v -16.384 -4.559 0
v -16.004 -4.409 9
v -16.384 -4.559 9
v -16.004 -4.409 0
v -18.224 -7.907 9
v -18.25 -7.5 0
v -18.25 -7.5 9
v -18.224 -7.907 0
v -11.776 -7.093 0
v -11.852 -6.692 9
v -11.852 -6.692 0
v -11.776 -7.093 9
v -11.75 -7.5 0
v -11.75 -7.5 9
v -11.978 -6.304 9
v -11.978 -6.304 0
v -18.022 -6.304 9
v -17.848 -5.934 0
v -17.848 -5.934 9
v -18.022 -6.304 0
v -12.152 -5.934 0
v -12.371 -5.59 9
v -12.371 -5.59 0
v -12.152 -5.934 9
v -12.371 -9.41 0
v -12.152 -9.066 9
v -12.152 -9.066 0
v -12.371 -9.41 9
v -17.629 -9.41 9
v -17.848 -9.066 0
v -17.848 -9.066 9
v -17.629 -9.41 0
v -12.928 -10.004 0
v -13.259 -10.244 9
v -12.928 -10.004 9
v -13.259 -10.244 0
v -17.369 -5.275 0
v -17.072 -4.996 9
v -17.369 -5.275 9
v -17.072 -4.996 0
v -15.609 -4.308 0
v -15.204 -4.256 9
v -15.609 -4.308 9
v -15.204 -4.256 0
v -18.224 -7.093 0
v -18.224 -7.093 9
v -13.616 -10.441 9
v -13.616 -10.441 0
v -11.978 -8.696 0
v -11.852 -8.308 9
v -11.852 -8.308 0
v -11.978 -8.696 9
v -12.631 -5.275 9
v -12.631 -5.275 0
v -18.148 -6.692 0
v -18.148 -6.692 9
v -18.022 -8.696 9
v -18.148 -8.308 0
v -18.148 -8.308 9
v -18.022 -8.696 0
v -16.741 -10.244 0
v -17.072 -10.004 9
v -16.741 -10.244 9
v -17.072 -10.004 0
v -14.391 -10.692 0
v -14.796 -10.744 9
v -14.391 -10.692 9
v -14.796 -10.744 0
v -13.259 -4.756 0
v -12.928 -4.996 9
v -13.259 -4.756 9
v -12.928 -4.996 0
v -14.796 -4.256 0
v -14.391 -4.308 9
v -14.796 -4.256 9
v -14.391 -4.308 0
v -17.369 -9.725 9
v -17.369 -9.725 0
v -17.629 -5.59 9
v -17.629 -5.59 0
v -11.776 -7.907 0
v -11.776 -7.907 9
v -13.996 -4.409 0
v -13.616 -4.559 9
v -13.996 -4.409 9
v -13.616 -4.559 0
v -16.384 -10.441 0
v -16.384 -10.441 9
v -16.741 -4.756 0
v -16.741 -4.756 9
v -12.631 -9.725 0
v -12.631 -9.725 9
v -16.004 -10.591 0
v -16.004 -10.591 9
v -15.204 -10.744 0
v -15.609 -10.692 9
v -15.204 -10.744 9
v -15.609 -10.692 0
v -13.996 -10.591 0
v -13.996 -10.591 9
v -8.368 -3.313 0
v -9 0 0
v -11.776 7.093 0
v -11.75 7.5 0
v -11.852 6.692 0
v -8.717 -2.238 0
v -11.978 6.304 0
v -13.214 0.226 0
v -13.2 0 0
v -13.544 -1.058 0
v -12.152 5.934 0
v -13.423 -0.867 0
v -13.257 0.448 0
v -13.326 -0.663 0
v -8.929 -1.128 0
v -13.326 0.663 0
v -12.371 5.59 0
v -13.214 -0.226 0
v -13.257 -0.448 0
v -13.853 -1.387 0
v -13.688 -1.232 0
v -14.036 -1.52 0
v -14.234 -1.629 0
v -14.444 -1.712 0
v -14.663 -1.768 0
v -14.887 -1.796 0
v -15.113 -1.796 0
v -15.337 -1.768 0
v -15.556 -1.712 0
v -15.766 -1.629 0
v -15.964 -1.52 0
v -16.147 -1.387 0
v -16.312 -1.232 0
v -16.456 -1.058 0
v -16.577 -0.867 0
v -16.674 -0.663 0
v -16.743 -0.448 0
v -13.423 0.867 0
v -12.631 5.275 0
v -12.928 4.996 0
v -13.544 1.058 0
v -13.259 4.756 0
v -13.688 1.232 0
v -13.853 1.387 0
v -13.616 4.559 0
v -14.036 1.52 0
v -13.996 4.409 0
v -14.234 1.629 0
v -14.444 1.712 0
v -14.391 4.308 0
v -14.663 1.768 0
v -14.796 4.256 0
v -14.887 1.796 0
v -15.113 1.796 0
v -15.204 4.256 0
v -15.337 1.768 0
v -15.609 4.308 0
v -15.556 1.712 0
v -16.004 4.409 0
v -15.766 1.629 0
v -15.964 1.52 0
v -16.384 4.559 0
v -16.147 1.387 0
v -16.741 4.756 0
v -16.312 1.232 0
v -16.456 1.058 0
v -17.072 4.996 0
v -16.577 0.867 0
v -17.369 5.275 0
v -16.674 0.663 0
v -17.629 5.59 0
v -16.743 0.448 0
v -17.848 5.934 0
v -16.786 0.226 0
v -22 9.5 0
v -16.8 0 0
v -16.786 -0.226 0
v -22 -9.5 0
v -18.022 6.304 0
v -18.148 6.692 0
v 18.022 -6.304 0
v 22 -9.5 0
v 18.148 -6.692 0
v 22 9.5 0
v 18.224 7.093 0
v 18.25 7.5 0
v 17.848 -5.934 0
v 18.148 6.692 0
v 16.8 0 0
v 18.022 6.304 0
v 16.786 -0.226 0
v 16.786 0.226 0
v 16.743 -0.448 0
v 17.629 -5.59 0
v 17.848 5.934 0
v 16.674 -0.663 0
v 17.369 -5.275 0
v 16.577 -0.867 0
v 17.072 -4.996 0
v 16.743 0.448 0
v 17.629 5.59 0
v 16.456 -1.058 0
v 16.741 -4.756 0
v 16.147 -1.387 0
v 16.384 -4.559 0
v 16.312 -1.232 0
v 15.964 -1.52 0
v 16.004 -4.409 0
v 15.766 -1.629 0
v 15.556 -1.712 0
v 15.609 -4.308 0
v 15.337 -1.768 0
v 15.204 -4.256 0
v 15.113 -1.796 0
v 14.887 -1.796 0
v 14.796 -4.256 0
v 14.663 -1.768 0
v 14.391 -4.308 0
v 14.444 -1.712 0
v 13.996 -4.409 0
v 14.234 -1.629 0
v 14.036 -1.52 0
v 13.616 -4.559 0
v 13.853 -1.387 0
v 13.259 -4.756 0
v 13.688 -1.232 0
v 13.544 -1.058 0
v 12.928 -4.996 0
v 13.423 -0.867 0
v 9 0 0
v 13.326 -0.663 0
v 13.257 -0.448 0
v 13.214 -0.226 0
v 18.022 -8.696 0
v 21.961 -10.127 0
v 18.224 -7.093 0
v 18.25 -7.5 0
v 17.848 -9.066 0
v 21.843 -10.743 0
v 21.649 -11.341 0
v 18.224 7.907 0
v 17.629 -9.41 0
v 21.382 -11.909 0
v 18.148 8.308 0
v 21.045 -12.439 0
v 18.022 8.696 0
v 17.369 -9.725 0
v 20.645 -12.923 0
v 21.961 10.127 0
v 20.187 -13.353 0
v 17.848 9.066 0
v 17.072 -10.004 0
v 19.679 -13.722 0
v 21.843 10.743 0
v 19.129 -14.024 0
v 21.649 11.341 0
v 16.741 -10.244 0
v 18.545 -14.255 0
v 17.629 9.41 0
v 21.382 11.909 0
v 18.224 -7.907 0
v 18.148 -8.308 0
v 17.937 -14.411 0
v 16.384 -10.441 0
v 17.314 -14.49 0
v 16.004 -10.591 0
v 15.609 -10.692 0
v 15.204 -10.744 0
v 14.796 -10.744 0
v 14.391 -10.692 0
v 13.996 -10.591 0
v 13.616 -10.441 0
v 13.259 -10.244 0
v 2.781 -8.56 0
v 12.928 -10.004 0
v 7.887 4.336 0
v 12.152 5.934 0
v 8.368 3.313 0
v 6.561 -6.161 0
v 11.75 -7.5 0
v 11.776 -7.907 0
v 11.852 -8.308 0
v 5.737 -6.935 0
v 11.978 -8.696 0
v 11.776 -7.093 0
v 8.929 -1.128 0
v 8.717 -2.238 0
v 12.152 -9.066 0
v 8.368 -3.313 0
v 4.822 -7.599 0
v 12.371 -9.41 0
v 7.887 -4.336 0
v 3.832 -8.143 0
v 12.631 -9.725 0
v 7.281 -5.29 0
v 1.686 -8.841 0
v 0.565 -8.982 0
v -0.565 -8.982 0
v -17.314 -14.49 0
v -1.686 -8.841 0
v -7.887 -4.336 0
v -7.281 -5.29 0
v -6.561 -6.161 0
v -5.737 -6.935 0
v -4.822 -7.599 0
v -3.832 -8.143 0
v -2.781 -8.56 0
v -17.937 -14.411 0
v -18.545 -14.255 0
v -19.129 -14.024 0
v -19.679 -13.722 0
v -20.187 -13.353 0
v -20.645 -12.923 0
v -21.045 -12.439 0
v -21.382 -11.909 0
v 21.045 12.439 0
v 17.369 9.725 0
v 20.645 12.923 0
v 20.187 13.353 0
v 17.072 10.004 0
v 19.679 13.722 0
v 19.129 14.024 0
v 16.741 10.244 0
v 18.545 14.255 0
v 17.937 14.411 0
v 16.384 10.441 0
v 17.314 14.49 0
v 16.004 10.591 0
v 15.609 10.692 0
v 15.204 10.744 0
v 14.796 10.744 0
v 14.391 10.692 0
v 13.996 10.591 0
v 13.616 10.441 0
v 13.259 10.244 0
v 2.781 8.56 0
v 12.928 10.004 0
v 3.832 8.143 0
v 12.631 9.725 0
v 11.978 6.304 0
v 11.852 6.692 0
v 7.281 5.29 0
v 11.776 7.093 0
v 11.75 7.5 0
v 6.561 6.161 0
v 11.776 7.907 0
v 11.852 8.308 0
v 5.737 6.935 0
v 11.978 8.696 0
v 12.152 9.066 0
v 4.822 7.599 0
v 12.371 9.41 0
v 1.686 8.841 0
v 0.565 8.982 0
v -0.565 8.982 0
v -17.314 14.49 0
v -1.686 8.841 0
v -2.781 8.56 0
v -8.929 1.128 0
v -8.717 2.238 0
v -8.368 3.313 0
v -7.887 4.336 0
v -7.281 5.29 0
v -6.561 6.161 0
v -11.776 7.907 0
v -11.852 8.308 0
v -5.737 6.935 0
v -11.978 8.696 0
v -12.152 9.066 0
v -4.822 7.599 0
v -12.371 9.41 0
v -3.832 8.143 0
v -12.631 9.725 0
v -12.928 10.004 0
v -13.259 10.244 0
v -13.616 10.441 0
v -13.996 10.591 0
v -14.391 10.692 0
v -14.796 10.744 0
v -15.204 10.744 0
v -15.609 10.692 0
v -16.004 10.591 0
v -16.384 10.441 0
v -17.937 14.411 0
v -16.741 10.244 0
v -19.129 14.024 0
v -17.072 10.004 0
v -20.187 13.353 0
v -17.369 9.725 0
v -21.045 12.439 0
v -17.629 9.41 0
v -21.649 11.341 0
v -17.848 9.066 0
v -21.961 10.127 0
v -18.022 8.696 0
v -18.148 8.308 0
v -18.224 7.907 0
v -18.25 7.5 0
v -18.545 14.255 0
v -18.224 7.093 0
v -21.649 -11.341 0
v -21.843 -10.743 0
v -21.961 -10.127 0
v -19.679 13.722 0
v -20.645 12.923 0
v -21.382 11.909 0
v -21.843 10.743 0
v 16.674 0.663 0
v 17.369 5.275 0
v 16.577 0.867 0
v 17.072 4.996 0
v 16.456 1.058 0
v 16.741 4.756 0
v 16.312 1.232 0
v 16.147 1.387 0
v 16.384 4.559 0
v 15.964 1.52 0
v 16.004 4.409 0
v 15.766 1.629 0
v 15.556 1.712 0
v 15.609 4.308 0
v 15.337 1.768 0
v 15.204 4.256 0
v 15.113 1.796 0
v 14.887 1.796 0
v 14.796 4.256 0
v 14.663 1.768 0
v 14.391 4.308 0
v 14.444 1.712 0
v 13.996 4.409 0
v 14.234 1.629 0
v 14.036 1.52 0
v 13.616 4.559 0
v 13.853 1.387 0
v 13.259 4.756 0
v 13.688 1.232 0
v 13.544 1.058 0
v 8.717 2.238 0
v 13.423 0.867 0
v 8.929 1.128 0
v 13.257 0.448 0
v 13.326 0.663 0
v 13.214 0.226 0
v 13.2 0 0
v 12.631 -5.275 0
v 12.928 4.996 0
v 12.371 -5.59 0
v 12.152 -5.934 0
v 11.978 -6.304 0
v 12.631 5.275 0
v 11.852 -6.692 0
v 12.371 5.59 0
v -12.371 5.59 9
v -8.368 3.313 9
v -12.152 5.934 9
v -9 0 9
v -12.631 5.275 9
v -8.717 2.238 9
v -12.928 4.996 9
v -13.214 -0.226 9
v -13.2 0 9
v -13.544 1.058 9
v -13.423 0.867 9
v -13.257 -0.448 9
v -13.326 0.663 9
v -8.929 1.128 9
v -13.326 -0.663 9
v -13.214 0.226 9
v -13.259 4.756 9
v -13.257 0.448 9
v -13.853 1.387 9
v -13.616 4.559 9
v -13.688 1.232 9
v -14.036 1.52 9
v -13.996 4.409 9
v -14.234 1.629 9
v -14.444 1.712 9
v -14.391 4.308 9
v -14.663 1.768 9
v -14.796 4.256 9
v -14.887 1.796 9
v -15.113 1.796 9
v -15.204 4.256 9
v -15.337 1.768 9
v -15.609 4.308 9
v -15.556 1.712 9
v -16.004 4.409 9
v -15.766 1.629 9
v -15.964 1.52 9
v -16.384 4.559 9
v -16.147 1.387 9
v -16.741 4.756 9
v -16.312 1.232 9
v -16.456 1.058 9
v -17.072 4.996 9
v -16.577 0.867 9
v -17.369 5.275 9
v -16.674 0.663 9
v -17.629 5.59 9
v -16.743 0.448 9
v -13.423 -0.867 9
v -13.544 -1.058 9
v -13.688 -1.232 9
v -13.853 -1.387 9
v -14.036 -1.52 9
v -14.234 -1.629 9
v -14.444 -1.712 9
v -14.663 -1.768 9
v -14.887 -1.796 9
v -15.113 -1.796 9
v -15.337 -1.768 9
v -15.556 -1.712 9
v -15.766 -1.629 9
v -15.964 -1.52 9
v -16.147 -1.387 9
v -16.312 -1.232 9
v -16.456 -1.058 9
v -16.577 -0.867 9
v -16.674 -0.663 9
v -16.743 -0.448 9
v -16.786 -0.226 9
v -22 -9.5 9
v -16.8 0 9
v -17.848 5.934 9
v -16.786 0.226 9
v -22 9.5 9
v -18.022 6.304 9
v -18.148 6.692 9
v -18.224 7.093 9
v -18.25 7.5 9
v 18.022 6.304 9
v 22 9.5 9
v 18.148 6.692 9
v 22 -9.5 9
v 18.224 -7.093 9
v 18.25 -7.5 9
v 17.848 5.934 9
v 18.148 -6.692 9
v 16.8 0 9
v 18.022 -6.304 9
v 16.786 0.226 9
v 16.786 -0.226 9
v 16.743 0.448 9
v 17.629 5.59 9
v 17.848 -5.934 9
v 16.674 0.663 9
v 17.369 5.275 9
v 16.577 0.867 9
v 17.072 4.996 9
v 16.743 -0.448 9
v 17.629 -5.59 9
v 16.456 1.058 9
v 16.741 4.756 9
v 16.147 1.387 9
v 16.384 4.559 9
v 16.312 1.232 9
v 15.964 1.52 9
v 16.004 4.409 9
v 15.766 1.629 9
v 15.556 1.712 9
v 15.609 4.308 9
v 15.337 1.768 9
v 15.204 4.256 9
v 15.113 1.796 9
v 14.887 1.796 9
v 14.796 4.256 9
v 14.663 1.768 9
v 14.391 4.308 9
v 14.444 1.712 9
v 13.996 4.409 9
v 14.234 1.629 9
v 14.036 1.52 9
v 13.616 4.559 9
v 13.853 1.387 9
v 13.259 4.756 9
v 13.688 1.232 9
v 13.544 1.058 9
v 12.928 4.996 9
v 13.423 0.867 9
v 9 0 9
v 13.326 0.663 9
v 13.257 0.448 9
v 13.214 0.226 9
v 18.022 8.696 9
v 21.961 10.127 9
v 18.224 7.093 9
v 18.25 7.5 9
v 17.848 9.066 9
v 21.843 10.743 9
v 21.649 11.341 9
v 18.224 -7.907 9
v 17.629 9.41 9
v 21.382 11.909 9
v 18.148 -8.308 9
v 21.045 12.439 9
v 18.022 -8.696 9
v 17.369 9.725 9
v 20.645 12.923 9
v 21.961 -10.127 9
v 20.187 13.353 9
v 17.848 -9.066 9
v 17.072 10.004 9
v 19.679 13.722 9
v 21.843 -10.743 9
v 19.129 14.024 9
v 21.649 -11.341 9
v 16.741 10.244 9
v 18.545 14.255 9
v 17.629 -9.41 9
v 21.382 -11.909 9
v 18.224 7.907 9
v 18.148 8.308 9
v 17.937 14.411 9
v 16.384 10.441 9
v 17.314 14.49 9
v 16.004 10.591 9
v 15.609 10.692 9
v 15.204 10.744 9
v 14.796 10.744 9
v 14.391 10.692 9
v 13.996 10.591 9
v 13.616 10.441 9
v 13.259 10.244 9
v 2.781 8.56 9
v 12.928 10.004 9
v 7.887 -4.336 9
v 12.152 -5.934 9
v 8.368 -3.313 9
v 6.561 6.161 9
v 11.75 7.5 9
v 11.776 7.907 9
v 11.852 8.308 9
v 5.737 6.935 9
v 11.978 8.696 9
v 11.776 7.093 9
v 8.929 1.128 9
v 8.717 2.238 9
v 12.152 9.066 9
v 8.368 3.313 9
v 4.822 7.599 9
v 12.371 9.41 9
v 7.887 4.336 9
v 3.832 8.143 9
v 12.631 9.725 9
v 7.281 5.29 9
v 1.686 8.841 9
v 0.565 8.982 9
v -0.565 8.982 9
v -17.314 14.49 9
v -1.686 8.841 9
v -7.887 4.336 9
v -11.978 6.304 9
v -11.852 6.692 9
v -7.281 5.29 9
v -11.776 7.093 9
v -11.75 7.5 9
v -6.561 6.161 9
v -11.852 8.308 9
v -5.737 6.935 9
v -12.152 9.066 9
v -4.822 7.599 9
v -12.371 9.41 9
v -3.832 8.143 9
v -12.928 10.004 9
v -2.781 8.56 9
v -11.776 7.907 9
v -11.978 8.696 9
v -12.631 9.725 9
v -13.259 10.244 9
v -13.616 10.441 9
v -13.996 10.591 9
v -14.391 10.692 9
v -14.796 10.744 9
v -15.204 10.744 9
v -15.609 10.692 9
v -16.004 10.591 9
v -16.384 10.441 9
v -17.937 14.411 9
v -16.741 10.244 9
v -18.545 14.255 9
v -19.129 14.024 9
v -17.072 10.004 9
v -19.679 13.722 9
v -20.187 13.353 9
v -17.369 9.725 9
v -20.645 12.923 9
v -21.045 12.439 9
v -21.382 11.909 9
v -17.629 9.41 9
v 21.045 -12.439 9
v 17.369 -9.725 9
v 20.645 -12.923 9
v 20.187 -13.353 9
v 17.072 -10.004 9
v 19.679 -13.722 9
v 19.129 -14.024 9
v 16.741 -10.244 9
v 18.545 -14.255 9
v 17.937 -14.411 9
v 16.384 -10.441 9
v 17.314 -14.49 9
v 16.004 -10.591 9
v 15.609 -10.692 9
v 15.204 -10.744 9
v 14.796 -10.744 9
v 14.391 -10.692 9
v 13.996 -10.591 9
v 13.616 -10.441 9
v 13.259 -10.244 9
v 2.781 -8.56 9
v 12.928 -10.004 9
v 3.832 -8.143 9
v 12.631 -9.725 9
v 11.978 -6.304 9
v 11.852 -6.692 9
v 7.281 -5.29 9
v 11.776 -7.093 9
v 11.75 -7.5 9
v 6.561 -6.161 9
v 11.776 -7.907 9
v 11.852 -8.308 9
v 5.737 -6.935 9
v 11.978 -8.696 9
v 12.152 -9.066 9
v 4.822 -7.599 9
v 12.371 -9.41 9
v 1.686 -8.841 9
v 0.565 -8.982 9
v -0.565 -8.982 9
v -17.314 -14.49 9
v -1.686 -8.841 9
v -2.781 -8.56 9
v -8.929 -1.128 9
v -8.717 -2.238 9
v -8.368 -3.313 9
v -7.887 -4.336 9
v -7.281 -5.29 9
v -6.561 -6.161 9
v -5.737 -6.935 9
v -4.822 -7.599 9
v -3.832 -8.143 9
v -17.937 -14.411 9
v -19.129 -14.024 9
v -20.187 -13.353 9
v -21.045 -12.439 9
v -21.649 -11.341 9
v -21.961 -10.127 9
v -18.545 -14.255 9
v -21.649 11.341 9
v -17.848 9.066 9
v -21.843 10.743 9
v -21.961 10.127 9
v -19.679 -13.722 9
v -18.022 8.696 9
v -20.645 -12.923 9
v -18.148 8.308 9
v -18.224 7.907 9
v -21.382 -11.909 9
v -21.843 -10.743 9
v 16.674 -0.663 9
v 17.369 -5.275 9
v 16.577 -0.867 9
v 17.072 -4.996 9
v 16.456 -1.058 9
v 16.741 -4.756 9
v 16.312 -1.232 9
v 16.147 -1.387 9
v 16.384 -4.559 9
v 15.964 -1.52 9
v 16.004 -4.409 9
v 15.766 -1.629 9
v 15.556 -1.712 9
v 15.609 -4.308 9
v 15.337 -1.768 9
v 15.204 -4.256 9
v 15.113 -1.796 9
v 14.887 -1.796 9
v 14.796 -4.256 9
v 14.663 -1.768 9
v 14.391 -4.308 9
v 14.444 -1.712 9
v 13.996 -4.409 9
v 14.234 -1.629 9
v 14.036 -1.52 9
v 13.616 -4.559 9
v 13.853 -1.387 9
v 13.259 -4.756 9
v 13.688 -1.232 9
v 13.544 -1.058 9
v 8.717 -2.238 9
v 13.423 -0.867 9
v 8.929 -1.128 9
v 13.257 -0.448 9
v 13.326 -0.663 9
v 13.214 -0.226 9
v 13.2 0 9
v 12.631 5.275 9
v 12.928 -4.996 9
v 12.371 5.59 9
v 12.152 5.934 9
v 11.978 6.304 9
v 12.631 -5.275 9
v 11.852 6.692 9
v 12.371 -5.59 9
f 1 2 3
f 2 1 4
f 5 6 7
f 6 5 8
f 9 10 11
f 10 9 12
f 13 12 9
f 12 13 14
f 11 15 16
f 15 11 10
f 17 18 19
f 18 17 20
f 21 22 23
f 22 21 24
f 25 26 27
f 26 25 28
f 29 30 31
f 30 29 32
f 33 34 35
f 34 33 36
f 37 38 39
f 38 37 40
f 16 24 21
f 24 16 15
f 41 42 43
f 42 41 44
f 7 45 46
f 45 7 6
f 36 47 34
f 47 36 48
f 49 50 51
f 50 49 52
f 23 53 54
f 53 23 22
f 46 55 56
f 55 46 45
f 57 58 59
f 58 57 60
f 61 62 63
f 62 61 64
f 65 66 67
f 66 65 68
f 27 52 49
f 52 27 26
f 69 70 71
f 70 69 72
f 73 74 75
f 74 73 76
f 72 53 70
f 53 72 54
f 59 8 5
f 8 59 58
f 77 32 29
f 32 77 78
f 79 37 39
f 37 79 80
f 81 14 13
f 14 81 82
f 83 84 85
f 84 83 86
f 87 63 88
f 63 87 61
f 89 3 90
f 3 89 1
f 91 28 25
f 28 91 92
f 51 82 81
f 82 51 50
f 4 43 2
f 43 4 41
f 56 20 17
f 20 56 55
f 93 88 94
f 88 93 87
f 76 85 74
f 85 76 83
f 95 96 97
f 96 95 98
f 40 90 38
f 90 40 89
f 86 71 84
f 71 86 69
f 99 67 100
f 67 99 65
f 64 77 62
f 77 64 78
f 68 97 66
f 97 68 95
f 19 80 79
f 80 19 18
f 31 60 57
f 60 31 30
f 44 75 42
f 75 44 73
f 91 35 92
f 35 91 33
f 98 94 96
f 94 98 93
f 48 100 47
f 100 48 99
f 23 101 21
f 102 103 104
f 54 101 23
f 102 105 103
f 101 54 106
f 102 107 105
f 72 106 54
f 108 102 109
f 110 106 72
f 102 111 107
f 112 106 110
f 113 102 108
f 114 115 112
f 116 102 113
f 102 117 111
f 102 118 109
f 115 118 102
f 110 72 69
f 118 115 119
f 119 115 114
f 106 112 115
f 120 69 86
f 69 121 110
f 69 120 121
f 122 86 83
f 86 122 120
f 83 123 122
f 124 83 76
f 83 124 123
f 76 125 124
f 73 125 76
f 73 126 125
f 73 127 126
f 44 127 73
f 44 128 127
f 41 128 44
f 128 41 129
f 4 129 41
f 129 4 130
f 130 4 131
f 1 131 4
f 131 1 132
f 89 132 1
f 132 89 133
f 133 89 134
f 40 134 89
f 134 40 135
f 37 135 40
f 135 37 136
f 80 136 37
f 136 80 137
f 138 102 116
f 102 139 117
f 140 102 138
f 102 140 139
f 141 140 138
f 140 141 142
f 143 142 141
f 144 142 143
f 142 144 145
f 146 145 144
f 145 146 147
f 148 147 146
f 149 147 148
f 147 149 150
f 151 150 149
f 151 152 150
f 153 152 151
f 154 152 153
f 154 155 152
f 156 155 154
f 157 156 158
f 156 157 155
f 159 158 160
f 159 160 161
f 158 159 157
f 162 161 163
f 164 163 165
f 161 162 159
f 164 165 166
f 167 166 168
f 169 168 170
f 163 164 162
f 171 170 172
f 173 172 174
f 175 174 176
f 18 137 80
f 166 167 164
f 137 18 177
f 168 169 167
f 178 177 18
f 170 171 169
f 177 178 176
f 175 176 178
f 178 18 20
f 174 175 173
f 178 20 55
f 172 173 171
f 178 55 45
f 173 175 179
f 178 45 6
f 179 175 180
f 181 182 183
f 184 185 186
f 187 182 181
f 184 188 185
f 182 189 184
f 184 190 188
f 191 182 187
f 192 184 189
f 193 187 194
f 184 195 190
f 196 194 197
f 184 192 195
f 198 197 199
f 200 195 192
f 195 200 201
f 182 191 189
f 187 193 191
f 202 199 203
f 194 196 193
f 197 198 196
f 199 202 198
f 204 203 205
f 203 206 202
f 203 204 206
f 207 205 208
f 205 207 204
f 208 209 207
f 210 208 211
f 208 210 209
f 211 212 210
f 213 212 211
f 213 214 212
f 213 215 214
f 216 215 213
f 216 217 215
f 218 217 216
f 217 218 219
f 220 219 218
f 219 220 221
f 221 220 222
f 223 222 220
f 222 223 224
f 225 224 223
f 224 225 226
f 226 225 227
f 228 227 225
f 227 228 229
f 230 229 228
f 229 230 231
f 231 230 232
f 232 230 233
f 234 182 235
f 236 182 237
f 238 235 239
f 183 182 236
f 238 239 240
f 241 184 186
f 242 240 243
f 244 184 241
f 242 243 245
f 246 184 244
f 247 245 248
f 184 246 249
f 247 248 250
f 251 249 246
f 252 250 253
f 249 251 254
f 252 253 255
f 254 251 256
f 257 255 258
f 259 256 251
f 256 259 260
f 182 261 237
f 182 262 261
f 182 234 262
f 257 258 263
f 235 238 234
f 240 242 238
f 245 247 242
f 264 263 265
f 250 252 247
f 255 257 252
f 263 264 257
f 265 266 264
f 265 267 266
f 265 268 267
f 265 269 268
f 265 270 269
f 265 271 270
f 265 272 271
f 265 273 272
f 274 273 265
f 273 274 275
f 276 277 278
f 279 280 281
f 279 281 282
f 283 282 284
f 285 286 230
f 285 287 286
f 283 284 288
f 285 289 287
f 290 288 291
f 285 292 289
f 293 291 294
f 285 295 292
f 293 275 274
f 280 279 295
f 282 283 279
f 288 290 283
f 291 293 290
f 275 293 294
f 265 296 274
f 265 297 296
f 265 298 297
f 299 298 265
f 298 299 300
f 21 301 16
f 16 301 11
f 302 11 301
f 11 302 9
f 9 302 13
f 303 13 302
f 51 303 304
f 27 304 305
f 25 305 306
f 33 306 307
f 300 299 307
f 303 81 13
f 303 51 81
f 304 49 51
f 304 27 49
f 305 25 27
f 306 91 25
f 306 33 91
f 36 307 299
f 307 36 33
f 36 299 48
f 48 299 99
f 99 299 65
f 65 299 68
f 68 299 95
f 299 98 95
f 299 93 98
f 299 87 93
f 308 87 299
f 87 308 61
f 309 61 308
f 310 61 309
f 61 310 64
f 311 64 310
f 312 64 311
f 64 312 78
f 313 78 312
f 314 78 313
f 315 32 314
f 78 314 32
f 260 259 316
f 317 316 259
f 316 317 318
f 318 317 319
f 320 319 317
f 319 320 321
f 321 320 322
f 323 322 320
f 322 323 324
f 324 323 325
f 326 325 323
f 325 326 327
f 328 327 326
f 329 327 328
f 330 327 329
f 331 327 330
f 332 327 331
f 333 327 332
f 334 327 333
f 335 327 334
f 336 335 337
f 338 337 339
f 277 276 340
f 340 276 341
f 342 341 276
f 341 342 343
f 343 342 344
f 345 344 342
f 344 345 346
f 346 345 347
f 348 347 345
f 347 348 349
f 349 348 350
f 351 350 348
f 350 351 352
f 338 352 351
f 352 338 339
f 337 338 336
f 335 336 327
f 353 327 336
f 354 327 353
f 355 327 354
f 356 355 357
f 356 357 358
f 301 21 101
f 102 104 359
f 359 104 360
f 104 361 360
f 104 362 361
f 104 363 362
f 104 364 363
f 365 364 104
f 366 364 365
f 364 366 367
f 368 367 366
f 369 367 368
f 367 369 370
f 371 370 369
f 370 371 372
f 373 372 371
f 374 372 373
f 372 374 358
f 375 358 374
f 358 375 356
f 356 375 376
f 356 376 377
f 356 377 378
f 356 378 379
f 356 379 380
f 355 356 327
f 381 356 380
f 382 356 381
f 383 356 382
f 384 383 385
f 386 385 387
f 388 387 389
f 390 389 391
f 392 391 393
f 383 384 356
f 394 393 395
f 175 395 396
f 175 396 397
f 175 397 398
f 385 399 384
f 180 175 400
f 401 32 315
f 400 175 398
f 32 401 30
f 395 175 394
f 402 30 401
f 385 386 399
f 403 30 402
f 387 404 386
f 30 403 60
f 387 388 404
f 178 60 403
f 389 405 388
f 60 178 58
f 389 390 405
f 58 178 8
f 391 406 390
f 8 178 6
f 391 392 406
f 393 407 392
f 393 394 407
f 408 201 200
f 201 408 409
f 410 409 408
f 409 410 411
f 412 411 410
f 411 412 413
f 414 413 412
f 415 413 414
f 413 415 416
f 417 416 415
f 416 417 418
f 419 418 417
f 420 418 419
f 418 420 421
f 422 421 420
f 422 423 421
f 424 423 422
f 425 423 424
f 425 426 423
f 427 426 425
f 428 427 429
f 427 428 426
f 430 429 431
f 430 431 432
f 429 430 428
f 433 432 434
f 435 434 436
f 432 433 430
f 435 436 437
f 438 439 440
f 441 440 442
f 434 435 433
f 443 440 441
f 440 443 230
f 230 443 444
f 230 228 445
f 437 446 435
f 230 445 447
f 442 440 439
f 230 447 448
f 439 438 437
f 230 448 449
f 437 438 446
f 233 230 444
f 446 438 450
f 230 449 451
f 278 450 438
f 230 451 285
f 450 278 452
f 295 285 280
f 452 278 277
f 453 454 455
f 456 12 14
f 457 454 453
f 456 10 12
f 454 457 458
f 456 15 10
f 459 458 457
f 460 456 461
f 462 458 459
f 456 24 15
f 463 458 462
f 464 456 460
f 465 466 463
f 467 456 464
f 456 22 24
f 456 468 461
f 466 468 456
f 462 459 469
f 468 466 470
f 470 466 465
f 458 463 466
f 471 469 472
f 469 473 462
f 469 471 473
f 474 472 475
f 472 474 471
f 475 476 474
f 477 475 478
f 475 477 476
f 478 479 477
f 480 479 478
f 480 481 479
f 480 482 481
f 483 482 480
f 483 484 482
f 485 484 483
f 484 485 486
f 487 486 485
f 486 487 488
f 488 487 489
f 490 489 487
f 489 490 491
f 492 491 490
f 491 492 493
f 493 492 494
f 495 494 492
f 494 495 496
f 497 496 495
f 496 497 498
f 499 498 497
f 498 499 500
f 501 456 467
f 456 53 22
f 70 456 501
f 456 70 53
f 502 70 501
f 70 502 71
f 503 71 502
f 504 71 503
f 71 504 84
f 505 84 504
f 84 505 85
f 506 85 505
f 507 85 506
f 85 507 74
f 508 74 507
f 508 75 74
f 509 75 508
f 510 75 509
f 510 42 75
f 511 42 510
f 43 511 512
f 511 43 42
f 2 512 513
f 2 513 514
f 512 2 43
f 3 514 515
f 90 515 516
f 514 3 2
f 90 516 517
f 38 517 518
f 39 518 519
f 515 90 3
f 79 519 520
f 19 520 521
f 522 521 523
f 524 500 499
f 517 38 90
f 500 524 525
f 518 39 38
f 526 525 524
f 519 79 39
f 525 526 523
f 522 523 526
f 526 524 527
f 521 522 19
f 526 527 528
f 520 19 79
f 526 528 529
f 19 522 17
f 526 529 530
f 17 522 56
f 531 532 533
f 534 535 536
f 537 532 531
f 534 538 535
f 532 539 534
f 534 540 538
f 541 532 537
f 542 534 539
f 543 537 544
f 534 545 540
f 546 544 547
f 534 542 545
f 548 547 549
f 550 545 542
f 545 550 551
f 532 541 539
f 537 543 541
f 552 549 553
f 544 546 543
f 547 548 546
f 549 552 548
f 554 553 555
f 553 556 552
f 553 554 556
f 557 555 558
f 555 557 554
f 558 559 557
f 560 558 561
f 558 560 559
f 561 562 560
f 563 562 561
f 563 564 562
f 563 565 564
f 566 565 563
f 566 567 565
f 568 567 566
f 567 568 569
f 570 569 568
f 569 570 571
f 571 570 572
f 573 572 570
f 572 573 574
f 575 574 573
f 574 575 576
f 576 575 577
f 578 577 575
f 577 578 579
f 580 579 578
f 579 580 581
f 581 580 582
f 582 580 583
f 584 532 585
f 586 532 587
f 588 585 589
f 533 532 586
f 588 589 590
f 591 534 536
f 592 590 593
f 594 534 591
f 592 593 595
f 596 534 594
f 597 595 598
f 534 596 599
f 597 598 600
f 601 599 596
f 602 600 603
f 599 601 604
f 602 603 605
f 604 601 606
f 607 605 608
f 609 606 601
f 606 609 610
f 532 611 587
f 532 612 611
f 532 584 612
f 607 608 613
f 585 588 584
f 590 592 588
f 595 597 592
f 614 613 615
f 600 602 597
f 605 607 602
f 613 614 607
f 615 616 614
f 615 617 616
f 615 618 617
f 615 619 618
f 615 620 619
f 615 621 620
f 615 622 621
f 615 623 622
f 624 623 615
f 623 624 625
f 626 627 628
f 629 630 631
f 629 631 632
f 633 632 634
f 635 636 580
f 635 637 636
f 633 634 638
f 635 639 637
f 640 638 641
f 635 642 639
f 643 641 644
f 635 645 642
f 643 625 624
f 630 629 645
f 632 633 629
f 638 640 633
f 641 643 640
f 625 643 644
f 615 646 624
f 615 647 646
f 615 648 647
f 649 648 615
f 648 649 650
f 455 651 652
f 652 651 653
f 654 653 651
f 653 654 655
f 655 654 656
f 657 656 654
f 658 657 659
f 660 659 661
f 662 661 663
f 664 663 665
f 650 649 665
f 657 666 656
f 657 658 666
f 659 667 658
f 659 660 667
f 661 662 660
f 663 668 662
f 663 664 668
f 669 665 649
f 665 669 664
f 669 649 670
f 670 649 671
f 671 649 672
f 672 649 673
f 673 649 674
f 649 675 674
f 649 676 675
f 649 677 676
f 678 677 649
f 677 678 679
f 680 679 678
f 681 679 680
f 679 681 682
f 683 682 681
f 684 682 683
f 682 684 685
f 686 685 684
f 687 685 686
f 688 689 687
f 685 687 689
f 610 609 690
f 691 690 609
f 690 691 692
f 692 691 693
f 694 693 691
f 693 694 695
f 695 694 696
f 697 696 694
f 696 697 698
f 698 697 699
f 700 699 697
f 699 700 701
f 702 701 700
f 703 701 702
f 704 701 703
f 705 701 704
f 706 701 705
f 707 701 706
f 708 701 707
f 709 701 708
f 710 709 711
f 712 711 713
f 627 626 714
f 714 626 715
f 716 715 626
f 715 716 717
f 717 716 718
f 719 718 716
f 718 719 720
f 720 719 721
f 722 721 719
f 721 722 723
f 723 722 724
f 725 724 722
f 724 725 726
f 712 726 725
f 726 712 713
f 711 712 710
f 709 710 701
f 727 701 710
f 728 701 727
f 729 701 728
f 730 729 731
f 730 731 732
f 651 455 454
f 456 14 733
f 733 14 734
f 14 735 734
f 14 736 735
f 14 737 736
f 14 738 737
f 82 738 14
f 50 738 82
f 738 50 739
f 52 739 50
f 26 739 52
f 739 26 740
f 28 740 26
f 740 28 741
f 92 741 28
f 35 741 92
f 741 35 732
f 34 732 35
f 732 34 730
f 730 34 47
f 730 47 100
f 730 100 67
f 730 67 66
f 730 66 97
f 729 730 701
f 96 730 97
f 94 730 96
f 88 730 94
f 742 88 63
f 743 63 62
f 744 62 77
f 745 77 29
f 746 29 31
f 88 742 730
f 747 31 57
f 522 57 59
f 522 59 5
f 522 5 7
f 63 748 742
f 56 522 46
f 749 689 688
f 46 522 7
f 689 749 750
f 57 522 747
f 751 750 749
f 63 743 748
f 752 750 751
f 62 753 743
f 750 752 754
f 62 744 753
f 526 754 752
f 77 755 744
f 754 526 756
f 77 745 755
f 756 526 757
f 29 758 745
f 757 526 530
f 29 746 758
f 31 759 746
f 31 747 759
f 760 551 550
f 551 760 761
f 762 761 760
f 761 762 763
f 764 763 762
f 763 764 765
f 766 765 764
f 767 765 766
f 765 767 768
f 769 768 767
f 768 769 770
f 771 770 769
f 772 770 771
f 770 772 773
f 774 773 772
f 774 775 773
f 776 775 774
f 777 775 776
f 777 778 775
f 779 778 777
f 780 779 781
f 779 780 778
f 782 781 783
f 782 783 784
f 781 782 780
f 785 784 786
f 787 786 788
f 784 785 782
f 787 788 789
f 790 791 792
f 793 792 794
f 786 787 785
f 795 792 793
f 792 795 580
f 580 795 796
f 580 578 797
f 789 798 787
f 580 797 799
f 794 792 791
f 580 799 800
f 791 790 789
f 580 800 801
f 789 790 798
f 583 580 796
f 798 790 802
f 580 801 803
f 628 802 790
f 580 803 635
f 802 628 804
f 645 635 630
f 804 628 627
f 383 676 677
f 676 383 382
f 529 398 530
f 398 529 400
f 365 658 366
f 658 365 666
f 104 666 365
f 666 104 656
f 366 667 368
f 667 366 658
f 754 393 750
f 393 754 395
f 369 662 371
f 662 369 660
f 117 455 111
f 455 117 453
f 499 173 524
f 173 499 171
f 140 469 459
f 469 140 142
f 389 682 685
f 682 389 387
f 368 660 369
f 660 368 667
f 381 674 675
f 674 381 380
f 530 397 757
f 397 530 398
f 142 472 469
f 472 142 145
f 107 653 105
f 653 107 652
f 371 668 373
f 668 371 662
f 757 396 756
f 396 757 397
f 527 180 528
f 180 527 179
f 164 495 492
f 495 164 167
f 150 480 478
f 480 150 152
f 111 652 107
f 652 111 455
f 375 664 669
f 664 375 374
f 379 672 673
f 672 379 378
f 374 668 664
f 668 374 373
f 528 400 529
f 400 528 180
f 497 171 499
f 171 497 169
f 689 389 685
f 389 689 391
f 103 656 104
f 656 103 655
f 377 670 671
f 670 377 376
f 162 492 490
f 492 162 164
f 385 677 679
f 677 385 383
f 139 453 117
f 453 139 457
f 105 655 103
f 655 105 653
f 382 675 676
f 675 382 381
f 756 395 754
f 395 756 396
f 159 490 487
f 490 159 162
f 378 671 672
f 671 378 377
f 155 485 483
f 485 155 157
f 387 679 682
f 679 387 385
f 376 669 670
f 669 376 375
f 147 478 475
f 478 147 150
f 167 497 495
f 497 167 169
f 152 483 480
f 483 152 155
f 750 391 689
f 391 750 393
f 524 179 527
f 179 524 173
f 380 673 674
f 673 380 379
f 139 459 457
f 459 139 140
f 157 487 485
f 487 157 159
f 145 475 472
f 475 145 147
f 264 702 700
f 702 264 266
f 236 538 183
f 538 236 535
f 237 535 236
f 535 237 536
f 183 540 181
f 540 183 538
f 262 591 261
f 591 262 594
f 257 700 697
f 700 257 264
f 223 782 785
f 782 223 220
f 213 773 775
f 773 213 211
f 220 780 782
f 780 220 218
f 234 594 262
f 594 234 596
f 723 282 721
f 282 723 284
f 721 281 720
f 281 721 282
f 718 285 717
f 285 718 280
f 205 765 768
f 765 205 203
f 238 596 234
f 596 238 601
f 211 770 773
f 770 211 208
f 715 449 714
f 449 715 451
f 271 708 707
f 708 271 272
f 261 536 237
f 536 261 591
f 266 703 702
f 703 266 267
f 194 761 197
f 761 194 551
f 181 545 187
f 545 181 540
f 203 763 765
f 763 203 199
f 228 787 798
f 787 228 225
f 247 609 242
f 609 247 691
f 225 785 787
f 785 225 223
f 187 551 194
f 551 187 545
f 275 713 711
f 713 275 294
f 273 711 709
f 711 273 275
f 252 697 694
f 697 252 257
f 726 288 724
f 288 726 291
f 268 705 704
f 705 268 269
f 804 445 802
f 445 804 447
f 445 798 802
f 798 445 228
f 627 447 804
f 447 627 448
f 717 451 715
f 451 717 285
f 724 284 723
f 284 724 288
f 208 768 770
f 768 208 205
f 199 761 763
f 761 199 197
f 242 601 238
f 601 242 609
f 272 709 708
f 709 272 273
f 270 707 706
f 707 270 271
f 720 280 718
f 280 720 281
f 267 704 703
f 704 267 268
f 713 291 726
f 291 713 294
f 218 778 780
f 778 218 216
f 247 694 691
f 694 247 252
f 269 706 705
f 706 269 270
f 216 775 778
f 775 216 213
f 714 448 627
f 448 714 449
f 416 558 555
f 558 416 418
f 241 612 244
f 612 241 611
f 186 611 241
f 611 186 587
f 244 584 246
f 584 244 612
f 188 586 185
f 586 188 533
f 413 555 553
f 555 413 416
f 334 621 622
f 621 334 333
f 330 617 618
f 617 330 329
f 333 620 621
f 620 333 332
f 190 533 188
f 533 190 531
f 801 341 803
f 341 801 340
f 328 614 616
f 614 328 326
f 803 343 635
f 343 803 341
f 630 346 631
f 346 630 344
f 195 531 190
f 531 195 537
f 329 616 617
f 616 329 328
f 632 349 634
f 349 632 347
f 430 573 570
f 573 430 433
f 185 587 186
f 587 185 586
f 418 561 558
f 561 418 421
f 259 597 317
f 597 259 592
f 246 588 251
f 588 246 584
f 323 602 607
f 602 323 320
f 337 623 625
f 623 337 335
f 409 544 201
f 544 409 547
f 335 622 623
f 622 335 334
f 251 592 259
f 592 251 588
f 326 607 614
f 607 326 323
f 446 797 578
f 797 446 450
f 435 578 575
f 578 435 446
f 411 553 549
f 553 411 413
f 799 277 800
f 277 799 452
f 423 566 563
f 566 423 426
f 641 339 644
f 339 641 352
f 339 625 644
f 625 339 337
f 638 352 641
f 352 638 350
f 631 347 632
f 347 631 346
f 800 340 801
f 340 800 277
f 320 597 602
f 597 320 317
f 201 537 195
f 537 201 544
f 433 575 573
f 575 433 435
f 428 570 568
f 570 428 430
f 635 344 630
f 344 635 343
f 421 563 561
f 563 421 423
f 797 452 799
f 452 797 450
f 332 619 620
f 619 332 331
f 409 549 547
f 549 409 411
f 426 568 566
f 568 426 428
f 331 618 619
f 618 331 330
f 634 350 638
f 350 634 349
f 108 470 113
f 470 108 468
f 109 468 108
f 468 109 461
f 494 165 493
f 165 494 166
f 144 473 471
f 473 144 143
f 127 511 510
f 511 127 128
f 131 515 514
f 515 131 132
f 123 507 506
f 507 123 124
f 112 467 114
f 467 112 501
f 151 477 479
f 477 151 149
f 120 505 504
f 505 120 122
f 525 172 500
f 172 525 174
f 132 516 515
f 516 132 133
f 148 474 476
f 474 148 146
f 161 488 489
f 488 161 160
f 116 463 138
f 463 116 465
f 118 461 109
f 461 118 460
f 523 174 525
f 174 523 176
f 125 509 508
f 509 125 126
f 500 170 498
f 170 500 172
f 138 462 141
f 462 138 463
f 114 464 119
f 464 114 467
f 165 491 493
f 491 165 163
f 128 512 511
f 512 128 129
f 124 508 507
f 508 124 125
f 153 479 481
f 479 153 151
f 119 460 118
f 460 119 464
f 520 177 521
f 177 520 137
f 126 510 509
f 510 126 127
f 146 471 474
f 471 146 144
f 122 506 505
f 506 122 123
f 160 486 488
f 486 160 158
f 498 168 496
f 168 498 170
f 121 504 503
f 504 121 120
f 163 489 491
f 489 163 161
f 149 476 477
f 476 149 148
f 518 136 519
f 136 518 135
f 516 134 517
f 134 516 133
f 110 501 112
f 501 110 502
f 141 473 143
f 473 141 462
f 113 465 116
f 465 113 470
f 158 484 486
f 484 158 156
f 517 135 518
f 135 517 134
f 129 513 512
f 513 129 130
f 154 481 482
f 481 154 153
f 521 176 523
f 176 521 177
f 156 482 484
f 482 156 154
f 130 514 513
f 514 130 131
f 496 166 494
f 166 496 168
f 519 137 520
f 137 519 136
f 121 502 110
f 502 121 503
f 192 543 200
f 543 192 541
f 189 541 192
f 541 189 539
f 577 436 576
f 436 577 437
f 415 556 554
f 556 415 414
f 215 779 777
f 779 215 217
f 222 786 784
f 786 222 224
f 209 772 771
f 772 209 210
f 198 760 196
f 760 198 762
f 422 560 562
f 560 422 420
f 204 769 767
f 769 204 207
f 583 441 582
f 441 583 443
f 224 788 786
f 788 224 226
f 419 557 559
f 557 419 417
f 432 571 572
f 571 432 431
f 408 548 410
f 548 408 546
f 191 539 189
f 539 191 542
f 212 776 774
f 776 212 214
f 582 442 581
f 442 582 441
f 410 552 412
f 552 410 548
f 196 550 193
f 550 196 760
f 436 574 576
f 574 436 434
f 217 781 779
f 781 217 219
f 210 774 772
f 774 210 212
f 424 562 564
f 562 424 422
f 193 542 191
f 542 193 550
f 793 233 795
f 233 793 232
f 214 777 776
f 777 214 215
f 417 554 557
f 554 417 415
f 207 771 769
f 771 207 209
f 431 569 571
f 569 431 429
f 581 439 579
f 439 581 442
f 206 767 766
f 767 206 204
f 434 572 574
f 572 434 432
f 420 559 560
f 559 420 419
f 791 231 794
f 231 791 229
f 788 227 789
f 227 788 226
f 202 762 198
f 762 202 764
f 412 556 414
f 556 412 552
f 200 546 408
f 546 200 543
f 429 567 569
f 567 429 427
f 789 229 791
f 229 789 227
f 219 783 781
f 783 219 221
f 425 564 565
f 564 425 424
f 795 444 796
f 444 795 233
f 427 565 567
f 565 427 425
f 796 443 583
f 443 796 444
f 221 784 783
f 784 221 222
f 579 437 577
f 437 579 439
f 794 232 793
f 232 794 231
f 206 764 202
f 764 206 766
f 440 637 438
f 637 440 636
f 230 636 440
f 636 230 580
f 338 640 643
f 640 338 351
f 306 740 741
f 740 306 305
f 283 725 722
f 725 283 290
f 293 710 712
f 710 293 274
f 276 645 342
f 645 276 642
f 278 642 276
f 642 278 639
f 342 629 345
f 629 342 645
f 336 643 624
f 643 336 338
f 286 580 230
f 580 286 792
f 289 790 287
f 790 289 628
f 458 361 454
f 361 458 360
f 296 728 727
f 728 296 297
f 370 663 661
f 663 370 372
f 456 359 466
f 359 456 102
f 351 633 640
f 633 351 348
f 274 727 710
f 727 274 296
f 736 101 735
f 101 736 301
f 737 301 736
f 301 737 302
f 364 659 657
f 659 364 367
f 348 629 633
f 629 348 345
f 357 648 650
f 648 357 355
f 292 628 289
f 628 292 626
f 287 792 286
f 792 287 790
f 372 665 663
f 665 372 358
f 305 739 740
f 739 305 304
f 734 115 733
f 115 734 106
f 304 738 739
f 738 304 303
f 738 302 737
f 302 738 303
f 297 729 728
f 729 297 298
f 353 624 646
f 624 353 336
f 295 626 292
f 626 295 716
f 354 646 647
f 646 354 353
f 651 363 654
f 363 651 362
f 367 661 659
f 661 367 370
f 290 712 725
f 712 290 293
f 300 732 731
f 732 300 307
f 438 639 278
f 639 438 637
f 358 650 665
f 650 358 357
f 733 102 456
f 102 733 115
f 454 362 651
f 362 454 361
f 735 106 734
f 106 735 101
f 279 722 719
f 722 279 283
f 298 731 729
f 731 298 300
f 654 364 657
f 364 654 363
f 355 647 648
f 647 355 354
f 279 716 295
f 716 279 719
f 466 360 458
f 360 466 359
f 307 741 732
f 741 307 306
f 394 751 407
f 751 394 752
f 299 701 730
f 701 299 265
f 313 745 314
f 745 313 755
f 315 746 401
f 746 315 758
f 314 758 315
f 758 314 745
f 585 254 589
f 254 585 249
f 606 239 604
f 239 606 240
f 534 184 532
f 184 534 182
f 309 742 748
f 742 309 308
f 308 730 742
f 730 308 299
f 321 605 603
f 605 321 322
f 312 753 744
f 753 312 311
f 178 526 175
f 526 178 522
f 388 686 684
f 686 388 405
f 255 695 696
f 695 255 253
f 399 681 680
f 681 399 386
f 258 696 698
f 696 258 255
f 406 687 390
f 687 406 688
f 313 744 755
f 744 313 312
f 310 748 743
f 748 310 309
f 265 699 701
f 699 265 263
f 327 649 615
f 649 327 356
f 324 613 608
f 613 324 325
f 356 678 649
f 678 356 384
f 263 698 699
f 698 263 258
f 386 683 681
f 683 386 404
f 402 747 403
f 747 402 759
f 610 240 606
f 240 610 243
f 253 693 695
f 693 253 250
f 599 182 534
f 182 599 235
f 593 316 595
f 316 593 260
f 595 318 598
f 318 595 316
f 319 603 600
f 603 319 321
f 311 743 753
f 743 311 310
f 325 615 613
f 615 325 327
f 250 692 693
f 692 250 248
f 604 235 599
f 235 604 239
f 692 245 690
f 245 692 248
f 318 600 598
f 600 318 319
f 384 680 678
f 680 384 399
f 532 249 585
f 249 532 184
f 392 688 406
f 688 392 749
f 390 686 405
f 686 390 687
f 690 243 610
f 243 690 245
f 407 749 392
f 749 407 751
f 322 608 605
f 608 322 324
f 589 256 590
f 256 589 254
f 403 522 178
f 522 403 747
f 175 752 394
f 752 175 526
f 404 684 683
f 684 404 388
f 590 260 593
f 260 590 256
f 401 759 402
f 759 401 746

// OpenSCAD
$fn = 50;

difference() {
	union() {
		hull() {
			translate(v = [-17.0, 9.5, 0]) {
				cylinder(h = 9, r = 5);
			}
			translate(v = [17.0, 9.5, 0]) {
				cylinder(h = 9, r = 5);
			}
			translate(v = [-17.0, -9.5, 0]) {
				cylinder(h = 9, r = 5);
			}
			translate(v = [17.0, -9.5, 0]) {
				cylinder(h = 9, r = 5);
			}
		}
	}
	union() {
		translate(v = [-15.0, -7.5, 0]) {
			cylinder(h = 9, r = 3.25);
		}
		translate(v = [-15.0, 7.5, 0]) {
			cylinder(h = 9, r = 3.25);
		}
		translate(v = [15.0, -7.5, 0]) {
			cylinder(h = 9, r = 3.25);
		}
		translate(v = [15.0, 7.5, 0]) {
			cylinder(h = 9, r = 3.25);
		}
		translate(v = [-15.0, 0.0, 0]) {
			cylinder(h = 9, r = 1.8);
		}
		translate(v = [15.0, 0.0, 0]) {
			cylinder(h = 9, r = 1.8);
		}
		cylinder(h = 9, r = 9.0);
	}
}
